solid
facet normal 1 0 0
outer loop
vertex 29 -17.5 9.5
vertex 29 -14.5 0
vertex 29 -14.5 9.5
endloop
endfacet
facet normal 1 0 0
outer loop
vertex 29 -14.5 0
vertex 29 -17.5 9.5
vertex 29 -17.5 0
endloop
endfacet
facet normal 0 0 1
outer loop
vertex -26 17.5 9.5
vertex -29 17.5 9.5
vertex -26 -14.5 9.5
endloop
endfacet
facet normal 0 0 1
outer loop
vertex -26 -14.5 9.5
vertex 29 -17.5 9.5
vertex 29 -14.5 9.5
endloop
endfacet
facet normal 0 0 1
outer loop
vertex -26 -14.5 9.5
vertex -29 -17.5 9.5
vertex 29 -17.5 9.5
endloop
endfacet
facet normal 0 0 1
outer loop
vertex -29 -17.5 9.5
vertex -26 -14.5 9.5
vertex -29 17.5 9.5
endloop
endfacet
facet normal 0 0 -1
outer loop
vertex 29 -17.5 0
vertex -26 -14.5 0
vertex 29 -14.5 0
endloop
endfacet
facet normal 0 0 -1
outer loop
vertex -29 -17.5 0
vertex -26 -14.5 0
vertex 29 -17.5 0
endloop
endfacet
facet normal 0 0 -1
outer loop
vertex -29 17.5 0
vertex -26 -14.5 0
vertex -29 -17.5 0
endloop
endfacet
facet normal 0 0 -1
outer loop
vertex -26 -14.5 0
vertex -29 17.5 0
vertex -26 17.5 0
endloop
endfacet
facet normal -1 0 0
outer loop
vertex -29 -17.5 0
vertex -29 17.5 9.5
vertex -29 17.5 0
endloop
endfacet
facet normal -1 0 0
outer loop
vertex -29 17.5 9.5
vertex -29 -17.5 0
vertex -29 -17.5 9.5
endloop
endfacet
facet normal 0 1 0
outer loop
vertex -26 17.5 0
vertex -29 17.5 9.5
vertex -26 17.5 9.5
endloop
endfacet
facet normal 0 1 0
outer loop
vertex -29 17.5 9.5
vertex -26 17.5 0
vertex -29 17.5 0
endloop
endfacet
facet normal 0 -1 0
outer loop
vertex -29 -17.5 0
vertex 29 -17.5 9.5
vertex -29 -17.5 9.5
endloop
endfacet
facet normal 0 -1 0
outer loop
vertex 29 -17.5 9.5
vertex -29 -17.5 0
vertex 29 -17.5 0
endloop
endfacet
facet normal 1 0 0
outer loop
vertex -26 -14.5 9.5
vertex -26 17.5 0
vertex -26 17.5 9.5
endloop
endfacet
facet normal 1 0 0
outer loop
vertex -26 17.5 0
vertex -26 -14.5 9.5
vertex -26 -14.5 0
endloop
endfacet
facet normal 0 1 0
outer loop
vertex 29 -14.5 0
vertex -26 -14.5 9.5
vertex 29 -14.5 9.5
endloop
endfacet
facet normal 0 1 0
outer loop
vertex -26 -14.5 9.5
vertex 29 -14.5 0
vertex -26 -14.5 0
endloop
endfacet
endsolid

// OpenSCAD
// file: BOSL2/std.scad
// Minimal BOSL2 compatibility shim for bundled gallery models.
// It implements only the helpers used by the imported OpenSCAD projects.

CENTER = [0, 0, 0];
BOTTOM = [0, 0, -1];
TOP = [0, 0, 1];
LEFT = [-1, 0, 0];
RIGHT = [1, 0, 0];
FRONT = [0, -1, 0];
BACK = [0, 1, 0];

module up(z=0) {
    translate([0, 0, z]) children();
}

module down(z=0) {
    translate([0, 0, -z]) children();
}

module attach(anchor=CENTER) {
    children();
}

module cuboid(size=[1, 1, 1], anchor=CENTER) {
    center = anchor == CENTER;
    translate(center ? [0, 0, 0] : [0, 0, size[2] / 2])
        cube(size, center=true);
    children();
}

module xcyl(h=1, r=1, anchor=CENTER) {
    center = anchor == CENTER;
    translate(center ? [0, 0, 0] : [h / 2, 0, 0])
        rotate([0, 90, 0])
            cylinder(h=h, r=r, center=true);
}
// main file
include <BOSL2/std.scad>

// Start config
// Panel Size
panel_size = [ 58, 35 ]; // mm
// Pi Board
pi_board_size = [ 51, 21 ];                                        // mm
pi_board_screw_holes_center_from_board_edge_distance = [ 2, 4.8 ]; // mm
pi_board_screw_holes_diameter = 2.1;                               // mm
pi_board_offset = [ 1.75, -6.56 ];
pi_board_usb_size = [ 8.5, 4.5 ];
pi_board_usb_rounding_radius = 0.5; // mm
// pi_board_inset_depth = 0.2; //mm (keep at zero for final)

// Screen
screen_pcb_size = [ 24.7, 27, 13.3 ];                                  // mm (+- 0.2) 13.3mm are pin headers.
screen_pcb_screw_holes_center_from_board_edge_distance = [ 2.1, 2.0 ]; // mm
screen_pcb_screw_holes_diameter = 2.8;                                 // mm
screen_pcb_screw_holes_spacing = [ 20.5, 23 ];                         // mm
active_screen_area = [ 21.74, 10.86 ];                                 // mm (old: 13.86)
active_screen_area_offset_from_corner = [ 1.48, 6.58 ];                // mm
screen_rounding_radius = 0.5;                                          // mm
screen_count = 2;

// Screws
m2_screw_head_depth = 1;   // mm it's 2mm normally
m2_screw_head_diameter = 4.0; // mm (adding .6mm for tolerances)
m2_screw_nut_depth = 1;    // mm it's 1.6mm normally
m2_screw_nut_diameter = 5.0;  // mm (adding .6mm for tolerances)
m2_screw_diameter = 2;        // mm

// Asanoha
asanoha_pattern_size = [ 40.7, 20.35 ]; // mm
asanoha_area_rounding_radius = 3;       // mm

// Stand
stand_size = [ 3, 6, 6 ];
stand_rounding_radius = 1.5;       // mm
stand_hinge_ball_diameter = 2;     // mm
stand_hinge_ball_offset = 0;       // mm
stand_panel_tolerance = 0.25;      // mm
stand_panel_thickness = 1.5;       // mm
stand_panel_rounding_radius = 1.5; // mm
stand_asanoha_pattern_unit_length = 10.175; // mm
stand_asanoha_repeat = [5,3];

// Misc
walls_depth = 9.5;     // mm
walls_thickness = 1.5; // mm
panel_thickness = 1.5; // mm
rounding_radius = 1.5; // mm

resolution = 80;
// End config

module panel()
{
    difference()
    {
        cuboid([ panel_size.x, panel_size.y, walls_depth ], rounding = rounding_radius,
               edges = [ FRONT + RIGHT, FRONT + LEFT, BACK + RIGHT, BACK + LEFT ], $fn = resolution,
               anchor = LEFT + BOTTOM + FRONT);
        translate([ walls_thickness, walls_thickness, 0 ])
            cuboid([ panel_size.x - walls_thickness * 2, panel_size.y - walls_thickness * 2, walls_depth ],
                   rounding = rounding_radius, edges = [ FRONT + RIGHT, FRONT + LEFT, BACK + RIGHT, BACK + LEFT ],
                   $fn = resolution, anchor = LEFT + BOTTOM + FRONT);
    }
}

module raspberry_pi_pico_micro_usb_port()
{
    translate([ 0, pi_board_size.y / 2 - pi_board_usb_size.x / 2, 0 ]) cuboid(
        [ walls_thickness * 2, pi_board_usb_size.x, pi_board_usb_size.y ], rounding = pi_board_usb_rounding_radius,
        edges = [ FRONT + TOP, BACK + TOP, BOTTOM + FRONT, BOTTOM + BACK ], $fn = resolution,
        anchor = LEFT + BOTTOM + FRONT);
}

module raspberry_pi_pico()
{
    rpip_anchor = [ 0, pi_board_offset.y + screen_anchor_coords.y, 0 ];
    // translate(rpip_anchor) translate ([0,0,panel_thickness-pi_board_inset_depth])
    // cube([pi_board_size.x,pi_board_size.y,pi_board_inset_depth]);
    translate(rpip_anchor) raspberry_pi_pico_micro_usb_port();
}

screen_anchor_coords =
    [ panel_size.x / 2 - screen_pcb_size.x / 2 * screen_count, panel_size.y / 2 - active_screen_area.y / 2, 0 ];
difference()
{
    panel();
    raspberry_pi_pico();
}
